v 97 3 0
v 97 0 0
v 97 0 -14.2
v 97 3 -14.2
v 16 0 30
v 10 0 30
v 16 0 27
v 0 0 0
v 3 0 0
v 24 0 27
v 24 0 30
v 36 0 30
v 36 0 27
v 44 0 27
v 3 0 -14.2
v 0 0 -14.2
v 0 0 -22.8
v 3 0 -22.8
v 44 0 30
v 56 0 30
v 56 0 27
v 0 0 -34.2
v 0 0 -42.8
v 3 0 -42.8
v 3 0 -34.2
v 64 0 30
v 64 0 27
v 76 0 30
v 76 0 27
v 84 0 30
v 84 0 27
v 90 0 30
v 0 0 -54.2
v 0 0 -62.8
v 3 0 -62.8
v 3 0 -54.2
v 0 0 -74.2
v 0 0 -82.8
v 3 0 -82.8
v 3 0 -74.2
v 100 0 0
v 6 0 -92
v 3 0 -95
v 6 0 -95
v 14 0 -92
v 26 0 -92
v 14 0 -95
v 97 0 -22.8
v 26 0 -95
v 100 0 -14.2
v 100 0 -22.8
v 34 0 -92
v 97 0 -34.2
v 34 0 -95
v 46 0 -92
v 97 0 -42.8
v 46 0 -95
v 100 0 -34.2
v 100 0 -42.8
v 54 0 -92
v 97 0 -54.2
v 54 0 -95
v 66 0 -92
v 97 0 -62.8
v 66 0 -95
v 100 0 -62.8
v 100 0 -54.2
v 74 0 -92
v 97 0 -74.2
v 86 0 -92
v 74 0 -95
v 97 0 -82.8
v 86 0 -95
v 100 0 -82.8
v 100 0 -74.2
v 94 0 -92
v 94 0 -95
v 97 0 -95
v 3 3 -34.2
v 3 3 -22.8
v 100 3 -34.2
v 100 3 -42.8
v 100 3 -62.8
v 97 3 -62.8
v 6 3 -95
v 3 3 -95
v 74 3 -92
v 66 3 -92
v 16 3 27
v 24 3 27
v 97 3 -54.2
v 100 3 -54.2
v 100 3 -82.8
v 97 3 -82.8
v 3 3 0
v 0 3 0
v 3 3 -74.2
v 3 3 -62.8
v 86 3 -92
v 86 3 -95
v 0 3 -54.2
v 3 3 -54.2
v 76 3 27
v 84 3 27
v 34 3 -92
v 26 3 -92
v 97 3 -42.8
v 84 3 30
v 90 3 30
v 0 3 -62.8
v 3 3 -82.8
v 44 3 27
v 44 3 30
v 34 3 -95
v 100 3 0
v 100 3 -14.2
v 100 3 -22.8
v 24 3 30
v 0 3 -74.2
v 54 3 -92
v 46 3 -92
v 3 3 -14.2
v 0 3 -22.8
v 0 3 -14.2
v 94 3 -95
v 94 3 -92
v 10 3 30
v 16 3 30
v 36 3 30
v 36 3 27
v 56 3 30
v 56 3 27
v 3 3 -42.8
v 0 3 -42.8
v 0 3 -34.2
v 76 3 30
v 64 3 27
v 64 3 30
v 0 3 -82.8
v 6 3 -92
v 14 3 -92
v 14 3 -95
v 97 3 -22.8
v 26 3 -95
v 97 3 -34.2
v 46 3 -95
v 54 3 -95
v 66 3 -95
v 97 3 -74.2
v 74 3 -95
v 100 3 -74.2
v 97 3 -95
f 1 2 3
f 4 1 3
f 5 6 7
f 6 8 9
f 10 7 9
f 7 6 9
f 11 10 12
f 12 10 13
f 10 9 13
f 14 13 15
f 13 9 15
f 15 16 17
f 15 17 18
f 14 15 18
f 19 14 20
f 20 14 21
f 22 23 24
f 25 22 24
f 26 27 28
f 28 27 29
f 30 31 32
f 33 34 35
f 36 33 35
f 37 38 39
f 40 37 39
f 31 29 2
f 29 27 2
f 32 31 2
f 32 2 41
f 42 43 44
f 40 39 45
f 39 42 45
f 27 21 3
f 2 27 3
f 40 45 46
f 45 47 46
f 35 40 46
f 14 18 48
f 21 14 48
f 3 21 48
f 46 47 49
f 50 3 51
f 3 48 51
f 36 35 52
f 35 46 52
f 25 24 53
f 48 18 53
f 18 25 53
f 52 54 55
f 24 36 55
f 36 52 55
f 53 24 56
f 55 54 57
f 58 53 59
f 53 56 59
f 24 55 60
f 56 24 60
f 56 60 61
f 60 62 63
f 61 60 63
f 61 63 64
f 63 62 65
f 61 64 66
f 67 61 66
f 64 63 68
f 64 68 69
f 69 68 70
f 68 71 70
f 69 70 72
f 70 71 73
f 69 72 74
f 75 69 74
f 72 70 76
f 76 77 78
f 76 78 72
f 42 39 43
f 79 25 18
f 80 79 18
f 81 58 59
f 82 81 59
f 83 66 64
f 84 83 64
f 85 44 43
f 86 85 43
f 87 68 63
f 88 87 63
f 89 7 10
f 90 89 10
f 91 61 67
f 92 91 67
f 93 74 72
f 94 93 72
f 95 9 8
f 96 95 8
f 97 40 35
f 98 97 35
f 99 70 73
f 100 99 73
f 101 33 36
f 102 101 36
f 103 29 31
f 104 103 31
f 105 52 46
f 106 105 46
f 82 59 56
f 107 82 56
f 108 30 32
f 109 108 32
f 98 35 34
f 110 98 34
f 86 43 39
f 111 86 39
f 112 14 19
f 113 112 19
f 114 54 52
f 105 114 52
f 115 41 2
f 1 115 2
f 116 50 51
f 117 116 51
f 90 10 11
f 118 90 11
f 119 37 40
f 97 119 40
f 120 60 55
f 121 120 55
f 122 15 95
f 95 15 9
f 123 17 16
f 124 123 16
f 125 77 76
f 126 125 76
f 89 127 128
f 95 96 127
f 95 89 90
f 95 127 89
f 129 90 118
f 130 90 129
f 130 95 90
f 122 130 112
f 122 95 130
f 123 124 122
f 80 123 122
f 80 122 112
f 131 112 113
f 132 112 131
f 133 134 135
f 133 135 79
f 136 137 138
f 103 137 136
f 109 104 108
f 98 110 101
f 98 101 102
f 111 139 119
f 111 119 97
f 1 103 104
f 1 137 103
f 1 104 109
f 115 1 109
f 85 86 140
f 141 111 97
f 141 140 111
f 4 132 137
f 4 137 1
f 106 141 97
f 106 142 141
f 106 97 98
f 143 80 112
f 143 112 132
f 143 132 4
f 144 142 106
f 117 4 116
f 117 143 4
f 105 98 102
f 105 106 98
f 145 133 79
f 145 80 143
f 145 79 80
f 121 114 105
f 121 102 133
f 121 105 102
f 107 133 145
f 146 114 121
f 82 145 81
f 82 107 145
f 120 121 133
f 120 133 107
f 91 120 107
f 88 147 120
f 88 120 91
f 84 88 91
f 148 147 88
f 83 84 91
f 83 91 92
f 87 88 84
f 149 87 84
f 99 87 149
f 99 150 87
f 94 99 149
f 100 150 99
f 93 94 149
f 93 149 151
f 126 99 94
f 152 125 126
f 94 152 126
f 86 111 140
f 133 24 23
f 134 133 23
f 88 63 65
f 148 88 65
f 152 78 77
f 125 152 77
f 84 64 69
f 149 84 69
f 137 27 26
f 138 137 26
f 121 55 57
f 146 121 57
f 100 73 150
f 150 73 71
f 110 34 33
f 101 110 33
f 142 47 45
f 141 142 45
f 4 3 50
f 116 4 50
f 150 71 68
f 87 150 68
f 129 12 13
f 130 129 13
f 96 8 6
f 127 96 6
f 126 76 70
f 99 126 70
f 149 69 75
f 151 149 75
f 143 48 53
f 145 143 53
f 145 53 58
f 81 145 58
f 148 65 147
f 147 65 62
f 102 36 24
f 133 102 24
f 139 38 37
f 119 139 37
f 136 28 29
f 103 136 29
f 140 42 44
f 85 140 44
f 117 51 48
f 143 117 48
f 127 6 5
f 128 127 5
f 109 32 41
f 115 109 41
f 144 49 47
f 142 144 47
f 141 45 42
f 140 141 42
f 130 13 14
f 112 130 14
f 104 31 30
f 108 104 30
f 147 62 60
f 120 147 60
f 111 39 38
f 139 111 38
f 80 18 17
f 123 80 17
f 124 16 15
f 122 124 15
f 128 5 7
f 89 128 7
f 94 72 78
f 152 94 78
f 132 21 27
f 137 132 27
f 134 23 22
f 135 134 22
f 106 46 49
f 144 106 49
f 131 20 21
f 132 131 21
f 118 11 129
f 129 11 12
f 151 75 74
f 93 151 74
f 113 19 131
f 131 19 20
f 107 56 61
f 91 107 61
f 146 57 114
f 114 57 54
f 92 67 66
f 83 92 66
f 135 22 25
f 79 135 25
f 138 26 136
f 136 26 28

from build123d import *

# Parameters (mm, degrees)
BOSS_EXTRU_1_DEPTH = 3


with BuildPart() as part:
    # Esquisse1 → Boss.-Extru.1 (new body)
    with BuildSketch(Plane(origin=(0, 0, 0), x_dir=(1, 0, 0), z_dir=(0, 1, 0))):
        Polygon((3, 0), (0, 0), (10, -30), (16, -30), (16, -27), (24, -27), (24, -30), (36, -30), (36, -27), (44, -27), (44, -30), (56, -30), (56, -27), (64, -27), (64, -30), (76, -30), (76, -27), (84, -27), (84, -30), (90, -30), (100, 0), (97, 0), (97, 14.2), (100, 14.2), (100, 22.8), (97, 22.8), (97, 34.2), (100, 34.2), (100, 42.8), (97, 42.8), (97, 54.2), (100, 54.2), (100, 62.8), (97, 62.8), (97, 74.2), (100, 74.2), (100, 82.8), (97, 82.8), (97, 95), (94, 95), (94, 92), (86, 92), (86, 95), (74, 95), (74, 92), (66, 92), (66, 95), (54, 95), (54, 92), (46, 92), (46, 95), (34, 95), (34, 92), (26, 92), (26, 95), (14, 95), (14, 92), (6, 92), (6, 95), (3, 95), (3, 82.8), (0, 82.8), (0, 74.2), (3, 74.2), (3, 62.8), (0, 62.8), (0, 54.2), (3, 54.2), (3, 42.8), (0, 42.8), (0, 34.2), (3, 34.2), (3, 22.8), (0, 22.8), (0, 14.2), (3, 14.2), align=None)
    extrude(amount=BOSS_EXTRU_1_DEPTH)


solid = part.part
